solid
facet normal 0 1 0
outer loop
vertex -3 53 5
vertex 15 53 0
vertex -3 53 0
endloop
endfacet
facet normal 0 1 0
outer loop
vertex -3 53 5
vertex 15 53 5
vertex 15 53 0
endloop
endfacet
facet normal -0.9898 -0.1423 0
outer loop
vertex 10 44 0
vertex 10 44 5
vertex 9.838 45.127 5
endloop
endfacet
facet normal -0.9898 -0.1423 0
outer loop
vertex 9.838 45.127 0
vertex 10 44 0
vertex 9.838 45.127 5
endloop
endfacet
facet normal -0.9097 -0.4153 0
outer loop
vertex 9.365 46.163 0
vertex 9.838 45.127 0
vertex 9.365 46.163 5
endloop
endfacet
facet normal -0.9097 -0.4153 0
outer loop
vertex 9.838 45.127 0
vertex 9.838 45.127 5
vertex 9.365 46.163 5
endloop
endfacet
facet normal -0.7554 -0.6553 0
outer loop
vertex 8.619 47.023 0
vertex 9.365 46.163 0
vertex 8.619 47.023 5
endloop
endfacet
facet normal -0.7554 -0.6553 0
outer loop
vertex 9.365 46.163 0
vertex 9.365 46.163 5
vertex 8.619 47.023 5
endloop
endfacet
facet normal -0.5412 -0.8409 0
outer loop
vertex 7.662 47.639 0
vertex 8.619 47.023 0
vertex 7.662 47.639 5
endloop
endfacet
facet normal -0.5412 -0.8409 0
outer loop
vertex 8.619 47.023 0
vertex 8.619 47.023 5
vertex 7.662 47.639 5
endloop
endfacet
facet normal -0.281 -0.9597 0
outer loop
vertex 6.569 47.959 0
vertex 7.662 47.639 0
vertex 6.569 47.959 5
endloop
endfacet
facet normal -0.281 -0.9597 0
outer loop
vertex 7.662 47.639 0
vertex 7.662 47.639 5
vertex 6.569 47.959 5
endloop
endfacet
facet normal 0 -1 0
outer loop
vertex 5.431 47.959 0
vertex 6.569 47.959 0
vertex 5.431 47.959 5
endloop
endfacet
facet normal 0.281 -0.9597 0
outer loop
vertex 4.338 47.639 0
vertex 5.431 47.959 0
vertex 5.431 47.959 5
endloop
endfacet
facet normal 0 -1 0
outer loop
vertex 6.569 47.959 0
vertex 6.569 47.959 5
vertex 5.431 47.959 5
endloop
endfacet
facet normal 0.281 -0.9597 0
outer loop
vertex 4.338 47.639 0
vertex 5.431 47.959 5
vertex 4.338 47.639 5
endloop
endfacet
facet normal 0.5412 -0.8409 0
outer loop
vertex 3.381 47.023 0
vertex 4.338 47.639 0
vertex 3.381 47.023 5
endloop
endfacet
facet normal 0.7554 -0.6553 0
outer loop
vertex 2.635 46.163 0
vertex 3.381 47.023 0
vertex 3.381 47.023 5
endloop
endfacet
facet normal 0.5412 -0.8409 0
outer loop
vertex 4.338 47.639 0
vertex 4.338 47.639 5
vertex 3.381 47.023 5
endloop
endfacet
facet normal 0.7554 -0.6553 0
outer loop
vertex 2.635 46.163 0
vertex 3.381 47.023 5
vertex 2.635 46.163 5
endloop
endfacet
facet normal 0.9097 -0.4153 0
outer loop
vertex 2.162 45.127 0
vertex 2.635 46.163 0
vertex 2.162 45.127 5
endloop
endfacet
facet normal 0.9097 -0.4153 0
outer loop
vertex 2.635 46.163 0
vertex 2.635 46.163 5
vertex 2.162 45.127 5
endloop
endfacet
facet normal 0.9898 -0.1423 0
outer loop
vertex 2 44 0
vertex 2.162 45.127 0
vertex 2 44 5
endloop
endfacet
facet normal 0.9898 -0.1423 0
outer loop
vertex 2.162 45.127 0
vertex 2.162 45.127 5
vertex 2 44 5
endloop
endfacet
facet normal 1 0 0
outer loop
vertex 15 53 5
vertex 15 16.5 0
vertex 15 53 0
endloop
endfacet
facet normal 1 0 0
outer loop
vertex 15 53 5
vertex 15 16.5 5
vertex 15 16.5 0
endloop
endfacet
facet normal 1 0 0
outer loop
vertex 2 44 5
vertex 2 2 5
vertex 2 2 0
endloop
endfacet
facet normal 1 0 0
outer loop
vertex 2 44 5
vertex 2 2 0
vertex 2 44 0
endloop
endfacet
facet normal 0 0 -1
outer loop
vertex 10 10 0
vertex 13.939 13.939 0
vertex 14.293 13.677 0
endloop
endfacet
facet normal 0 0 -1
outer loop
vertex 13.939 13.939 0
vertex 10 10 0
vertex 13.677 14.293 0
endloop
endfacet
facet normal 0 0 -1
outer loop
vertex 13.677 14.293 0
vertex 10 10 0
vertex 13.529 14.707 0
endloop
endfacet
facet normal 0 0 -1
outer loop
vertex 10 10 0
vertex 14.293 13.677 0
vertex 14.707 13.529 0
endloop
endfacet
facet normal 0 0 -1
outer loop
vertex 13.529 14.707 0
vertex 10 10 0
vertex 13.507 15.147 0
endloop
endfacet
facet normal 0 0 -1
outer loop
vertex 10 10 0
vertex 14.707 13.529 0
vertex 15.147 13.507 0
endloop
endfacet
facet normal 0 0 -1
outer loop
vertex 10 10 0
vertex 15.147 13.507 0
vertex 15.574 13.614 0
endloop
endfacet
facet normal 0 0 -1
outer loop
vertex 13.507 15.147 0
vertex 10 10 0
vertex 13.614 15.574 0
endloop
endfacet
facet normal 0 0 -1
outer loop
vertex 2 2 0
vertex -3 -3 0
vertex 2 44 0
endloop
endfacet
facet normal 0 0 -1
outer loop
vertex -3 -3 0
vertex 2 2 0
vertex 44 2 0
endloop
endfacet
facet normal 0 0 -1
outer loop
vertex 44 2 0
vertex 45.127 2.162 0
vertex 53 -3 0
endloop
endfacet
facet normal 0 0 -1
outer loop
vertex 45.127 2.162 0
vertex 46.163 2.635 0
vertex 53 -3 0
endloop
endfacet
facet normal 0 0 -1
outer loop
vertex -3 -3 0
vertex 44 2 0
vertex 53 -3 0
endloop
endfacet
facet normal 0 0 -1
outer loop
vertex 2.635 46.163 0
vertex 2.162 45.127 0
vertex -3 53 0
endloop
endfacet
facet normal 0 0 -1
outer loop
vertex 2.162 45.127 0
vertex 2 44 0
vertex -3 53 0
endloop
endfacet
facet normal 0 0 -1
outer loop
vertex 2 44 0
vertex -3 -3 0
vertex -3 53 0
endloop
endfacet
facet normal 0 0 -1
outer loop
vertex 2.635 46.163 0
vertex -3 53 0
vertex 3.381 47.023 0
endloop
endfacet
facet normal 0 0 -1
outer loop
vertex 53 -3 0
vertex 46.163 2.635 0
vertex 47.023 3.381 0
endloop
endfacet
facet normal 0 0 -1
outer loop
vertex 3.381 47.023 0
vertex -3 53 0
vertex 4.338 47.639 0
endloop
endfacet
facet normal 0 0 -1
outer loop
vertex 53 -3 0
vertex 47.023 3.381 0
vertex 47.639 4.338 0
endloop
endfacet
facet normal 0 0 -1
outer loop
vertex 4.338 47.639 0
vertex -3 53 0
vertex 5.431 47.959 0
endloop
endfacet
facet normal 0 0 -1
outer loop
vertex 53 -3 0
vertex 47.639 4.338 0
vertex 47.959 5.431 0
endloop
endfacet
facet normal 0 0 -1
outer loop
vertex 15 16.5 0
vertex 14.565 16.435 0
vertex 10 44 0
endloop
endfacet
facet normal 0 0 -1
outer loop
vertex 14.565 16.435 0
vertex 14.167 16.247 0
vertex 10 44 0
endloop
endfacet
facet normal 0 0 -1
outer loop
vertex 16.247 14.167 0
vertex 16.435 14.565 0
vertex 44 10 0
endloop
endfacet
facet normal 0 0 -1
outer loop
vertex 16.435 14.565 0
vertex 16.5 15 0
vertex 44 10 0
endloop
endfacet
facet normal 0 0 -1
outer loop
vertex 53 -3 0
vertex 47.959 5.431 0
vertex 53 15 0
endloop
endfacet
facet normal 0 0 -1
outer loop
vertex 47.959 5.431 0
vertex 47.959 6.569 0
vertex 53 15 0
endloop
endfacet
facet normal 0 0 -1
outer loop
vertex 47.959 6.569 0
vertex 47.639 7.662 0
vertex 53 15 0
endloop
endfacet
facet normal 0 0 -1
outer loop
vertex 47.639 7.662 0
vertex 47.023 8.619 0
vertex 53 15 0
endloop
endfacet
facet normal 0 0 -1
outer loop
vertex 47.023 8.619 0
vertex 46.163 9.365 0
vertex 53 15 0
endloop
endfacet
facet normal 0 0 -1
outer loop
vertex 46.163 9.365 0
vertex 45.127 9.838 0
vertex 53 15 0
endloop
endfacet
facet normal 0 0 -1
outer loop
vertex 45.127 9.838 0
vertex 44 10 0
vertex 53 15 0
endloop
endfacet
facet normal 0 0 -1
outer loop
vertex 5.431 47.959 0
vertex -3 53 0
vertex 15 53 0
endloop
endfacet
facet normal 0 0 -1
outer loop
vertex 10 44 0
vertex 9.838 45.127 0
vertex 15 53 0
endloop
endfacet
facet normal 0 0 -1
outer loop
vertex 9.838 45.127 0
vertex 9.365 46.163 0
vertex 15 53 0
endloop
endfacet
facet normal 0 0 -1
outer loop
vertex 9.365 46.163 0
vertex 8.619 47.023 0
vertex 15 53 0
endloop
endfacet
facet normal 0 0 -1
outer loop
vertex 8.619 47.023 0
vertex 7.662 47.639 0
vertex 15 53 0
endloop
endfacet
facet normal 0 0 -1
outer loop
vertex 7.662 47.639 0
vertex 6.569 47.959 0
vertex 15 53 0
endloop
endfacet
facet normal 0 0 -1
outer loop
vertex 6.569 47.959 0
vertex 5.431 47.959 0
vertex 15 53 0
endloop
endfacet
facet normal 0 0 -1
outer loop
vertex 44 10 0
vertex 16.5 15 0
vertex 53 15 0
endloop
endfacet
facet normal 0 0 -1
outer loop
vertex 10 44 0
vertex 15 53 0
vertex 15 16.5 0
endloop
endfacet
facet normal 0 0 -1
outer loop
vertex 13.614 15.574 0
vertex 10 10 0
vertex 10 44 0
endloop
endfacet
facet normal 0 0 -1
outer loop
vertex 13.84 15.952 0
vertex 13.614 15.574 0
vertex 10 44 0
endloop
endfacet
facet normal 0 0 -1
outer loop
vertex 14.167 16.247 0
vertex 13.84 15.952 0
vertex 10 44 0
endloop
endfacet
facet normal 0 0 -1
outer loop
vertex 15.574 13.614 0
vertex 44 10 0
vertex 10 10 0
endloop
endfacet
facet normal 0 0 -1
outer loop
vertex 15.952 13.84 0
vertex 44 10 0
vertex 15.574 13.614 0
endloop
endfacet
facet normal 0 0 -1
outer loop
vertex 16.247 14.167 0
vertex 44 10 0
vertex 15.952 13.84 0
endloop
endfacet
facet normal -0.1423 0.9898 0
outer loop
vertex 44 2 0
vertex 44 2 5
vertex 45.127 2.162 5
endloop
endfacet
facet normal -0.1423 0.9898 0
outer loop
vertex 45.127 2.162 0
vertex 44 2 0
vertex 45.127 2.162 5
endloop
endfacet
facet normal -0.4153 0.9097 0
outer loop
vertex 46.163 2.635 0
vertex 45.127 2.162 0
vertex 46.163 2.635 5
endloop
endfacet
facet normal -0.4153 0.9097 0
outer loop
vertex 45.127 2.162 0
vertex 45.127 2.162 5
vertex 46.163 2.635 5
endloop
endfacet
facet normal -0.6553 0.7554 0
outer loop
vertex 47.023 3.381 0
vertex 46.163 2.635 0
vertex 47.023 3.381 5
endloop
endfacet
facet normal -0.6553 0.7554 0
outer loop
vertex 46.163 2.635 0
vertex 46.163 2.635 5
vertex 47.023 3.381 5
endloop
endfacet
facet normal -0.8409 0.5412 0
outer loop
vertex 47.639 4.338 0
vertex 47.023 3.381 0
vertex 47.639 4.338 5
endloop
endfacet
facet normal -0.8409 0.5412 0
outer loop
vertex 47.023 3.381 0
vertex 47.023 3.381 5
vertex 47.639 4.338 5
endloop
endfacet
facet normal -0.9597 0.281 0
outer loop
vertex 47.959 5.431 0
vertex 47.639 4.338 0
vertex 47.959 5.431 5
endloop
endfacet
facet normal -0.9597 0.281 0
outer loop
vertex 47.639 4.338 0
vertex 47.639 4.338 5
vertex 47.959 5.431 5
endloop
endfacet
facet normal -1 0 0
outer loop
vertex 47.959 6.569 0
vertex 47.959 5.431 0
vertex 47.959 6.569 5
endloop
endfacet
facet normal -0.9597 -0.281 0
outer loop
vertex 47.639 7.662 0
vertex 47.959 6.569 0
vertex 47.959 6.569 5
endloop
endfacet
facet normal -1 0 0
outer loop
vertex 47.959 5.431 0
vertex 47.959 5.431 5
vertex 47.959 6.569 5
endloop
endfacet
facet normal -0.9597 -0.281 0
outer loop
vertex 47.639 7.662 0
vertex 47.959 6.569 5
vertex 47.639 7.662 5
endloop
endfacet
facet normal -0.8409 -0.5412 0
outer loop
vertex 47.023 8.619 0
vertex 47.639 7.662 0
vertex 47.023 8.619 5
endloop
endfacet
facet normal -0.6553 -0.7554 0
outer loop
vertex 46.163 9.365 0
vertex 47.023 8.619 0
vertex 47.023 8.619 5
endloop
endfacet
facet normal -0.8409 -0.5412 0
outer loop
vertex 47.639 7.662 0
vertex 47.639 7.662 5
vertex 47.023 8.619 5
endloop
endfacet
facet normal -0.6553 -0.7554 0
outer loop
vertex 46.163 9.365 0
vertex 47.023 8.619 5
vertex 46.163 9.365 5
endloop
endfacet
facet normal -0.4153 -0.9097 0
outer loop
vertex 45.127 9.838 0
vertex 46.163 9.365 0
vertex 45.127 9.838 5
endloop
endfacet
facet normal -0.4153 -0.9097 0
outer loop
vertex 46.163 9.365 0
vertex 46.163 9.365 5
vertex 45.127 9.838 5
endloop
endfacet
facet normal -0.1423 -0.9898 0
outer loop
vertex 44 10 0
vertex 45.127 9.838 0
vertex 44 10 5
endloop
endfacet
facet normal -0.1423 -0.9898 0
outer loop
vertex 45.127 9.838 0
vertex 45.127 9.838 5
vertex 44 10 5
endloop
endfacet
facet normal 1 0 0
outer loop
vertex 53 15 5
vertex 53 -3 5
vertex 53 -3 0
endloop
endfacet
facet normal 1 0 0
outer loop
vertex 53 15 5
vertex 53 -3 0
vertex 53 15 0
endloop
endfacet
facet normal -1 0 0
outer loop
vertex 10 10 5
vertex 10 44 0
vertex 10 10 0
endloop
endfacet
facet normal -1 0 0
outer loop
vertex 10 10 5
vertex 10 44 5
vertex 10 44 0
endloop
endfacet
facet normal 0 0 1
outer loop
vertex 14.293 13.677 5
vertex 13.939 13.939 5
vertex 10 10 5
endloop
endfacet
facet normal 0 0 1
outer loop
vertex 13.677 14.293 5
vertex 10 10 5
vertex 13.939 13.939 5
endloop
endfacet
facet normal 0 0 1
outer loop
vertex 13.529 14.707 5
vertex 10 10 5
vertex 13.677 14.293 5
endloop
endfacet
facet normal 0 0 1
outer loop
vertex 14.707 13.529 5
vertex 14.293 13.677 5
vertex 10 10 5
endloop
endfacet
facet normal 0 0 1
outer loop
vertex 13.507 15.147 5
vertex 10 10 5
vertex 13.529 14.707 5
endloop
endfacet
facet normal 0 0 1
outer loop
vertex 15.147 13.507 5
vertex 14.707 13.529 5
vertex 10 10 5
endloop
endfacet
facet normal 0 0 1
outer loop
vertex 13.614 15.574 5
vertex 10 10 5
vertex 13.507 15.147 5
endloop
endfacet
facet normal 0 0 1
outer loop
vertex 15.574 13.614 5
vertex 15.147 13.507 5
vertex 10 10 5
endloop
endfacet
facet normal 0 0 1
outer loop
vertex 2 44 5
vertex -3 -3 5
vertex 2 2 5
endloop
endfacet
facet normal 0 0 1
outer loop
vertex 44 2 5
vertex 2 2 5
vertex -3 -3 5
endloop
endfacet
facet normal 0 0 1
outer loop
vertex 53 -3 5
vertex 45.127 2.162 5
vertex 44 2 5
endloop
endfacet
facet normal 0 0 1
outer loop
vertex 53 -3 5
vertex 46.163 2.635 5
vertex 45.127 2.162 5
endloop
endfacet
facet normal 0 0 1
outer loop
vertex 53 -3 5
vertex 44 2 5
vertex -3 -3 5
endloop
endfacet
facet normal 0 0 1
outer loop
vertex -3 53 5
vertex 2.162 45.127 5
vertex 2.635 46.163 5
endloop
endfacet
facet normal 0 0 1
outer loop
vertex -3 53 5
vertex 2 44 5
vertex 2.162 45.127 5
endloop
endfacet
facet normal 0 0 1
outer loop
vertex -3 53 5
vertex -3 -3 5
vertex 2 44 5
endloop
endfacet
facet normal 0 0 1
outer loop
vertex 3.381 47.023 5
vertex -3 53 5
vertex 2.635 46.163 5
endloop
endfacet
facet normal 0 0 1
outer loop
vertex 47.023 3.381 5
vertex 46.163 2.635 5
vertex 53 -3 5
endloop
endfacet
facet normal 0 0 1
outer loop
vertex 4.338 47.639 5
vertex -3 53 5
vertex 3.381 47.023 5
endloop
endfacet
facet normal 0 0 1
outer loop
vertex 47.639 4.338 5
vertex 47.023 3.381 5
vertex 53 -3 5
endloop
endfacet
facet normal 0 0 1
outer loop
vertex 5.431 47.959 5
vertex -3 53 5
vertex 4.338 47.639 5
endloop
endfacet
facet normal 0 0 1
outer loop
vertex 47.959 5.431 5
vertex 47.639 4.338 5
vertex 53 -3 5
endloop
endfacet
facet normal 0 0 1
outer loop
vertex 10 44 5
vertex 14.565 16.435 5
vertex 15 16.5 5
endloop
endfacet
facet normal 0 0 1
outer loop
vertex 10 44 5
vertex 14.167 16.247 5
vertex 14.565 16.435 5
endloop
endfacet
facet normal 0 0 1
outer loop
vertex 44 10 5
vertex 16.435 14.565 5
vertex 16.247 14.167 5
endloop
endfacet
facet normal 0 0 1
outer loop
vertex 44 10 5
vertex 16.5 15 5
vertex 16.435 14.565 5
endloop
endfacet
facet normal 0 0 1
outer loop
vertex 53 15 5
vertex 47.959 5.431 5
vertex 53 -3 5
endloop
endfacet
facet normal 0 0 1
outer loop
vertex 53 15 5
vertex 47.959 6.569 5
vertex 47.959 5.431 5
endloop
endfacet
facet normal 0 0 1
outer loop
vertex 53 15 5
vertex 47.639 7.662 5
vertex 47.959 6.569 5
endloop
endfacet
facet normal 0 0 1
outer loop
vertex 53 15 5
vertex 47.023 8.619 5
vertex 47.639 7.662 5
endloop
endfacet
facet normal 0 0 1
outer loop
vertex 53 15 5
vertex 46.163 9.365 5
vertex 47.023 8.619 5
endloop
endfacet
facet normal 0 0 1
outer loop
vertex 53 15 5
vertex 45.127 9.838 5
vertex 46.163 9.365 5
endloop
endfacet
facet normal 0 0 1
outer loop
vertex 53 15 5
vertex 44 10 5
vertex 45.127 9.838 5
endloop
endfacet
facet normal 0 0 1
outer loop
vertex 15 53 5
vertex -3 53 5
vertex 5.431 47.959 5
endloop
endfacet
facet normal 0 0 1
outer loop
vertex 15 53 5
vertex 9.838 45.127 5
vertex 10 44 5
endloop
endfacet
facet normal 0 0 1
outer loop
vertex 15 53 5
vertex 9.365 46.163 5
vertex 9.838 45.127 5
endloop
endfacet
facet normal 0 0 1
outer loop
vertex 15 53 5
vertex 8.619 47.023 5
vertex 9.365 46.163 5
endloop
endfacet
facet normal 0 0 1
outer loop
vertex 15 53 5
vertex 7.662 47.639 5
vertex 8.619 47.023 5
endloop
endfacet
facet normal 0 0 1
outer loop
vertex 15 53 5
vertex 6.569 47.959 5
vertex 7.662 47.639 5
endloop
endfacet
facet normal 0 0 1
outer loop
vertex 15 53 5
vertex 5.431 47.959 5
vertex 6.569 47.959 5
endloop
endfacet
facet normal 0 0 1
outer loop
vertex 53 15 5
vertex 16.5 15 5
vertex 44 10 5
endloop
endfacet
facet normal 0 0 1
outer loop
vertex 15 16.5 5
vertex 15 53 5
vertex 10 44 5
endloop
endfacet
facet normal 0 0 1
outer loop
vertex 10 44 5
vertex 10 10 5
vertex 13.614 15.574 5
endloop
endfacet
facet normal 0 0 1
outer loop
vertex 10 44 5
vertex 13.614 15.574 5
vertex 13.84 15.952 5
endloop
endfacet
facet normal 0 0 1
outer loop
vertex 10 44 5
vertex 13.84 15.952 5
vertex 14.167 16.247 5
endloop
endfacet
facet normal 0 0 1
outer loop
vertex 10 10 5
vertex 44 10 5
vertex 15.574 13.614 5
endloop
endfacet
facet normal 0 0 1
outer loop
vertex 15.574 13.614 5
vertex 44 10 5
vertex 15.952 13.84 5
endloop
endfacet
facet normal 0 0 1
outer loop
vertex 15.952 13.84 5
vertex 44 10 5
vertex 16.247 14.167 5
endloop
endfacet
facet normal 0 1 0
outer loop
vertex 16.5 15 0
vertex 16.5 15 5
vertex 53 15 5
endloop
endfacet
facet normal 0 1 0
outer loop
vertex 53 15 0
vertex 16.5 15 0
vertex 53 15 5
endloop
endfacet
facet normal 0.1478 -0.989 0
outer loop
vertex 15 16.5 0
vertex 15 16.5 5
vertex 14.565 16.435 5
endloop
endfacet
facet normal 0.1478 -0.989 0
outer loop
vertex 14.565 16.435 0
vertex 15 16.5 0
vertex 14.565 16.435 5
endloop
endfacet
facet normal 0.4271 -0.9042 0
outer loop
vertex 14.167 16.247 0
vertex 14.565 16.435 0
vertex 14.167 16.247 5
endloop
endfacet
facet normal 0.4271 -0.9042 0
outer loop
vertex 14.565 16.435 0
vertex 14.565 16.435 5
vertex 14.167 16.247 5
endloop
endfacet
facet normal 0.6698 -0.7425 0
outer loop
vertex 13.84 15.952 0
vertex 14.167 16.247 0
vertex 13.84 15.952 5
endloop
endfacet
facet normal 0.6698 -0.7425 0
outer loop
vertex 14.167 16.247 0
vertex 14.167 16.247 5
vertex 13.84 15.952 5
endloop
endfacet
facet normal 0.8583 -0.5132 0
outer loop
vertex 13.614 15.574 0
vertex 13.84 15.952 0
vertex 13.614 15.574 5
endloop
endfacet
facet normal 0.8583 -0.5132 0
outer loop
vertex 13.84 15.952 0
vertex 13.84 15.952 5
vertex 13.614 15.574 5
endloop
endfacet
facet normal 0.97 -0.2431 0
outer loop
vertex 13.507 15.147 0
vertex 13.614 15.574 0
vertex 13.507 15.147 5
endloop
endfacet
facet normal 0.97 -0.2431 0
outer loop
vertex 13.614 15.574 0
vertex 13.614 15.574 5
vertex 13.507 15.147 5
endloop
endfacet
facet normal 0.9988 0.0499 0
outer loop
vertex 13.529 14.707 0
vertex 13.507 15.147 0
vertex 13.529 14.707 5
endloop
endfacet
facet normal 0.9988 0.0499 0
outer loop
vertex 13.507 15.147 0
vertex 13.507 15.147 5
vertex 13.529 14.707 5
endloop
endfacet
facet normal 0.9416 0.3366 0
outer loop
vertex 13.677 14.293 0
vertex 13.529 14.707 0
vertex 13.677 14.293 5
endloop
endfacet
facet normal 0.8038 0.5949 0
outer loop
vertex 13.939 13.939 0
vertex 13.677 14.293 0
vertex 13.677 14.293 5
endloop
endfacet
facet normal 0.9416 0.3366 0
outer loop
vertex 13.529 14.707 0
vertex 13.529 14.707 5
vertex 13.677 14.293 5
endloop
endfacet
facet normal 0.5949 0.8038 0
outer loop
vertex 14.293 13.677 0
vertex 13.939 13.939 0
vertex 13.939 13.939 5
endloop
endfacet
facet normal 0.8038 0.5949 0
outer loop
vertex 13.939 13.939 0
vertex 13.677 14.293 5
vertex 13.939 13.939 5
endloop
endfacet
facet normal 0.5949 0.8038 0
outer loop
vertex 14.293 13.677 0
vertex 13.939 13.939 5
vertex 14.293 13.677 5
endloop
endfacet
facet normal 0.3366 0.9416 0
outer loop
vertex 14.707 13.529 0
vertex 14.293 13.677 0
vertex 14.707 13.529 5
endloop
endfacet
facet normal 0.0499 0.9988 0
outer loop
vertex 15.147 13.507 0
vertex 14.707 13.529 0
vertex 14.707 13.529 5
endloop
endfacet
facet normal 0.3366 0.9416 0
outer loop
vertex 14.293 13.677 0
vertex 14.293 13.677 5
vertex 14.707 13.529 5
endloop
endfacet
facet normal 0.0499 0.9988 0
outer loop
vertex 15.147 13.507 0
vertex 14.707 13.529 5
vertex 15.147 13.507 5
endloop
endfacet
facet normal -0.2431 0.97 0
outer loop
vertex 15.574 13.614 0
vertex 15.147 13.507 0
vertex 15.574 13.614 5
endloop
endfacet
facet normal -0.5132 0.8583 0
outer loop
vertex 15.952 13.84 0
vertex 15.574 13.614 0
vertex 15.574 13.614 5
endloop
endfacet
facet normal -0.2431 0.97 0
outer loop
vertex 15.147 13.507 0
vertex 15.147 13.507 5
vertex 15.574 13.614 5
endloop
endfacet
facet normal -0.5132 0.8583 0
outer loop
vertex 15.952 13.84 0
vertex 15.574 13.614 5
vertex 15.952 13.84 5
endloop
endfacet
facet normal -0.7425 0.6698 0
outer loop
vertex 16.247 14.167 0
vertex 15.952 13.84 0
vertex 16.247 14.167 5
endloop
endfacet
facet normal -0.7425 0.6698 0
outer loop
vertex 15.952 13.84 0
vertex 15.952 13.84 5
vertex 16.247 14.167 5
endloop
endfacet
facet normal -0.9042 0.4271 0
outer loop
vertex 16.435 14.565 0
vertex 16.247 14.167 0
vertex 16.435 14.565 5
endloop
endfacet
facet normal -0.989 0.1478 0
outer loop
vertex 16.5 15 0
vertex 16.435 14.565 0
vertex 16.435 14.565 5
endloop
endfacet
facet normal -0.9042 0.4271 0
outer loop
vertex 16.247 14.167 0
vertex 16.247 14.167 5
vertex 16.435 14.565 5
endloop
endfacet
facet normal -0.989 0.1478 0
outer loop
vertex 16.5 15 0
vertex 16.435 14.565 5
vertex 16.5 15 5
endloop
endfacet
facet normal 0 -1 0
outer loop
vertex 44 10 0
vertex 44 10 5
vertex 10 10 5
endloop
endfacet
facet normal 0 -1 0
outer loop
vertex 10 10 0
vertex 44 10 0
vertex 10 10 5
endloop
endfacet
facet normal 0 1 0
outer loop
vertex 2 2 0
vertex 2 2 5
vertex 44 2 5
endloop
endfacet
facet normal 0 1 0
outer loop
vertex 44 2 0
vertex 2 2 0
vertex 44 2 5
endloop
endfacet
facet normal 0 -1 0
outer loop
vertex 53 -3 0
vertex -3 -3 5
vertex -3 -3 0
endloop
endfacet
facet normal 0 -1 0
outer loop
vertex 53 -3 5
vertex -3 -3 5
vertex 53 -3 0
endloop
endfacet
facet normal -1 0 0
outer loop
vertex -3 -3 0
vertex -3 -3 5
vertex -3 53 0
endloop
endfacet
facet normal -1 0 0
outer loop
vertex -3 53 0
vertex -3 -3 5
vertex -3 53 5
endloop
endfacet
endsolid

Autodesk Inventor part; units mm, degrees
ref_plane "YZ Plane" through (0, 0, 0) normal (1, 0, 0) x (0, 1, 0)
ref_plane "XZ Plane" through (0, 0, 0) normal (0, 1, 0) x (-1, 0, 0)
ref_plane "XY Plane" through (0, 0, 0) normal (0, 0, 1) x (1, 0, 0)
sketch "Sketch1" plane through (0, 0, 0) normal (0, 0, 1) x (1, 0, 0)
  line L0 (0, 0) -> (0, 50)
  line L1 (0, 50) -> (12, 50)
  line L2 (12, 50) -> (12, 12)
  line L3 (12, 12) -> (50, 12)
  line L4 (50, 12) -> (50, 0)
  line L5 (50, 0) -> (0, 0)
  dimension "d0" = 50
  dimension "d1" = 12
  dimension "d2" = 38
  dimension "d3" = 38
extrude "Extrusion1" add sketch "Sketch1" along normal blind 5
sketch "Sketch2" plane through (0, 0, 5) normal (0, 0, 1) x (1, 0, 0)
  line L0 (10, 44) -> (10, 2)
  line L1 (10, 2) -> (2, 2)
  line L2 (2, 2) -> (2, 44)
  line L3 (12, 12) -> (12, 50) projected
  line L4 (12, 50) -> (0, 50) projected
  arc A0 (10, 44) -> (2, 44) centre (6, 44) ccw
  line L5 (0, 0) -> (50, 0) projected
  line L6 (2, 2) -> (44, 2)
  line L7 (44, 10) -> (2, 10)
  line L8 (2, 10) -> (2, 2)
  arc A1 (44, 2) -> (44, 10) centre (44, 6) ccw
  line L9 (50, 0) -> (50, 12) projected
  line L10 (50, 12) -> (12, 12) projected
  point P0 (10, 2)
  point P1 (10, 10)
  dimension "d6" = 8
  dimension "d7" = 2
  dimension "d9" = 4
  dimension "d10" = 6
  dimension "d11" = 2
  dimension "d12" = 8
  dimension "d13" = 6
  dimension "d14" = 2
  dimension "d15" = 4
extrude "Extrusion2" cut sketch "Sketch2" against normal through all
sketch "Sketch3" plane through (0, 0, 5) normal (0, 0, 1) x (1, 0, 0)
  line L0 (15, 15) -> (15, 50)
  line L1 (-3, 50) -> (-3, 0)
  line L2 (15, 15) -> (53, 15)
  line L3 (50, -3) -> (-3, -3)
  line L4 (-3, -3) -> (-3, 16.0843)
  line L5 (0, 50) -> (0, 0) projected
  line L6 (12, 12) -> (12, 50) projected
  line L7 (50, 12) -> (12, 12) projected
  line L8 (0, 0) -> (50, 0) projected
  line L9 (15, 50) -> (15, 53)
  line L10 (15, 53) -> (-3, 53)
  line L11 (-3, 53) -> (-3, 50)
  line L12 (50, -3) -> (53, -3)
  line L13 (53, -3) -> (53, 15)
  line L14 (12, 50) -> (0, 50) projected
  line L15 (50, 0) -> (50, 12) projected
  dimension "d18" = 3
  dimension "d19" = 3
  dimension "d20" = 3
  dimension "d21" = 3
  dimension "d24" = 3
  dimension "d25" = 3
extrude "Extrusion3" add sketch "Sketch3" against normal blind 5
sketch "Sketch4" plane through (0, 0, 5) normal (0, 0, 1) x (1, 0, 0)
  line L0 (53, 15) -> (15, 15) projected
  circle A0 centre (15, 15) radius 1.5
  point P0 (0, 0)
  dimension "d28" = 3
extrude "Extrusion4" cut sketch "Sketch4" against normal blind 5
properties part number "Kabelhalterung_V1"
